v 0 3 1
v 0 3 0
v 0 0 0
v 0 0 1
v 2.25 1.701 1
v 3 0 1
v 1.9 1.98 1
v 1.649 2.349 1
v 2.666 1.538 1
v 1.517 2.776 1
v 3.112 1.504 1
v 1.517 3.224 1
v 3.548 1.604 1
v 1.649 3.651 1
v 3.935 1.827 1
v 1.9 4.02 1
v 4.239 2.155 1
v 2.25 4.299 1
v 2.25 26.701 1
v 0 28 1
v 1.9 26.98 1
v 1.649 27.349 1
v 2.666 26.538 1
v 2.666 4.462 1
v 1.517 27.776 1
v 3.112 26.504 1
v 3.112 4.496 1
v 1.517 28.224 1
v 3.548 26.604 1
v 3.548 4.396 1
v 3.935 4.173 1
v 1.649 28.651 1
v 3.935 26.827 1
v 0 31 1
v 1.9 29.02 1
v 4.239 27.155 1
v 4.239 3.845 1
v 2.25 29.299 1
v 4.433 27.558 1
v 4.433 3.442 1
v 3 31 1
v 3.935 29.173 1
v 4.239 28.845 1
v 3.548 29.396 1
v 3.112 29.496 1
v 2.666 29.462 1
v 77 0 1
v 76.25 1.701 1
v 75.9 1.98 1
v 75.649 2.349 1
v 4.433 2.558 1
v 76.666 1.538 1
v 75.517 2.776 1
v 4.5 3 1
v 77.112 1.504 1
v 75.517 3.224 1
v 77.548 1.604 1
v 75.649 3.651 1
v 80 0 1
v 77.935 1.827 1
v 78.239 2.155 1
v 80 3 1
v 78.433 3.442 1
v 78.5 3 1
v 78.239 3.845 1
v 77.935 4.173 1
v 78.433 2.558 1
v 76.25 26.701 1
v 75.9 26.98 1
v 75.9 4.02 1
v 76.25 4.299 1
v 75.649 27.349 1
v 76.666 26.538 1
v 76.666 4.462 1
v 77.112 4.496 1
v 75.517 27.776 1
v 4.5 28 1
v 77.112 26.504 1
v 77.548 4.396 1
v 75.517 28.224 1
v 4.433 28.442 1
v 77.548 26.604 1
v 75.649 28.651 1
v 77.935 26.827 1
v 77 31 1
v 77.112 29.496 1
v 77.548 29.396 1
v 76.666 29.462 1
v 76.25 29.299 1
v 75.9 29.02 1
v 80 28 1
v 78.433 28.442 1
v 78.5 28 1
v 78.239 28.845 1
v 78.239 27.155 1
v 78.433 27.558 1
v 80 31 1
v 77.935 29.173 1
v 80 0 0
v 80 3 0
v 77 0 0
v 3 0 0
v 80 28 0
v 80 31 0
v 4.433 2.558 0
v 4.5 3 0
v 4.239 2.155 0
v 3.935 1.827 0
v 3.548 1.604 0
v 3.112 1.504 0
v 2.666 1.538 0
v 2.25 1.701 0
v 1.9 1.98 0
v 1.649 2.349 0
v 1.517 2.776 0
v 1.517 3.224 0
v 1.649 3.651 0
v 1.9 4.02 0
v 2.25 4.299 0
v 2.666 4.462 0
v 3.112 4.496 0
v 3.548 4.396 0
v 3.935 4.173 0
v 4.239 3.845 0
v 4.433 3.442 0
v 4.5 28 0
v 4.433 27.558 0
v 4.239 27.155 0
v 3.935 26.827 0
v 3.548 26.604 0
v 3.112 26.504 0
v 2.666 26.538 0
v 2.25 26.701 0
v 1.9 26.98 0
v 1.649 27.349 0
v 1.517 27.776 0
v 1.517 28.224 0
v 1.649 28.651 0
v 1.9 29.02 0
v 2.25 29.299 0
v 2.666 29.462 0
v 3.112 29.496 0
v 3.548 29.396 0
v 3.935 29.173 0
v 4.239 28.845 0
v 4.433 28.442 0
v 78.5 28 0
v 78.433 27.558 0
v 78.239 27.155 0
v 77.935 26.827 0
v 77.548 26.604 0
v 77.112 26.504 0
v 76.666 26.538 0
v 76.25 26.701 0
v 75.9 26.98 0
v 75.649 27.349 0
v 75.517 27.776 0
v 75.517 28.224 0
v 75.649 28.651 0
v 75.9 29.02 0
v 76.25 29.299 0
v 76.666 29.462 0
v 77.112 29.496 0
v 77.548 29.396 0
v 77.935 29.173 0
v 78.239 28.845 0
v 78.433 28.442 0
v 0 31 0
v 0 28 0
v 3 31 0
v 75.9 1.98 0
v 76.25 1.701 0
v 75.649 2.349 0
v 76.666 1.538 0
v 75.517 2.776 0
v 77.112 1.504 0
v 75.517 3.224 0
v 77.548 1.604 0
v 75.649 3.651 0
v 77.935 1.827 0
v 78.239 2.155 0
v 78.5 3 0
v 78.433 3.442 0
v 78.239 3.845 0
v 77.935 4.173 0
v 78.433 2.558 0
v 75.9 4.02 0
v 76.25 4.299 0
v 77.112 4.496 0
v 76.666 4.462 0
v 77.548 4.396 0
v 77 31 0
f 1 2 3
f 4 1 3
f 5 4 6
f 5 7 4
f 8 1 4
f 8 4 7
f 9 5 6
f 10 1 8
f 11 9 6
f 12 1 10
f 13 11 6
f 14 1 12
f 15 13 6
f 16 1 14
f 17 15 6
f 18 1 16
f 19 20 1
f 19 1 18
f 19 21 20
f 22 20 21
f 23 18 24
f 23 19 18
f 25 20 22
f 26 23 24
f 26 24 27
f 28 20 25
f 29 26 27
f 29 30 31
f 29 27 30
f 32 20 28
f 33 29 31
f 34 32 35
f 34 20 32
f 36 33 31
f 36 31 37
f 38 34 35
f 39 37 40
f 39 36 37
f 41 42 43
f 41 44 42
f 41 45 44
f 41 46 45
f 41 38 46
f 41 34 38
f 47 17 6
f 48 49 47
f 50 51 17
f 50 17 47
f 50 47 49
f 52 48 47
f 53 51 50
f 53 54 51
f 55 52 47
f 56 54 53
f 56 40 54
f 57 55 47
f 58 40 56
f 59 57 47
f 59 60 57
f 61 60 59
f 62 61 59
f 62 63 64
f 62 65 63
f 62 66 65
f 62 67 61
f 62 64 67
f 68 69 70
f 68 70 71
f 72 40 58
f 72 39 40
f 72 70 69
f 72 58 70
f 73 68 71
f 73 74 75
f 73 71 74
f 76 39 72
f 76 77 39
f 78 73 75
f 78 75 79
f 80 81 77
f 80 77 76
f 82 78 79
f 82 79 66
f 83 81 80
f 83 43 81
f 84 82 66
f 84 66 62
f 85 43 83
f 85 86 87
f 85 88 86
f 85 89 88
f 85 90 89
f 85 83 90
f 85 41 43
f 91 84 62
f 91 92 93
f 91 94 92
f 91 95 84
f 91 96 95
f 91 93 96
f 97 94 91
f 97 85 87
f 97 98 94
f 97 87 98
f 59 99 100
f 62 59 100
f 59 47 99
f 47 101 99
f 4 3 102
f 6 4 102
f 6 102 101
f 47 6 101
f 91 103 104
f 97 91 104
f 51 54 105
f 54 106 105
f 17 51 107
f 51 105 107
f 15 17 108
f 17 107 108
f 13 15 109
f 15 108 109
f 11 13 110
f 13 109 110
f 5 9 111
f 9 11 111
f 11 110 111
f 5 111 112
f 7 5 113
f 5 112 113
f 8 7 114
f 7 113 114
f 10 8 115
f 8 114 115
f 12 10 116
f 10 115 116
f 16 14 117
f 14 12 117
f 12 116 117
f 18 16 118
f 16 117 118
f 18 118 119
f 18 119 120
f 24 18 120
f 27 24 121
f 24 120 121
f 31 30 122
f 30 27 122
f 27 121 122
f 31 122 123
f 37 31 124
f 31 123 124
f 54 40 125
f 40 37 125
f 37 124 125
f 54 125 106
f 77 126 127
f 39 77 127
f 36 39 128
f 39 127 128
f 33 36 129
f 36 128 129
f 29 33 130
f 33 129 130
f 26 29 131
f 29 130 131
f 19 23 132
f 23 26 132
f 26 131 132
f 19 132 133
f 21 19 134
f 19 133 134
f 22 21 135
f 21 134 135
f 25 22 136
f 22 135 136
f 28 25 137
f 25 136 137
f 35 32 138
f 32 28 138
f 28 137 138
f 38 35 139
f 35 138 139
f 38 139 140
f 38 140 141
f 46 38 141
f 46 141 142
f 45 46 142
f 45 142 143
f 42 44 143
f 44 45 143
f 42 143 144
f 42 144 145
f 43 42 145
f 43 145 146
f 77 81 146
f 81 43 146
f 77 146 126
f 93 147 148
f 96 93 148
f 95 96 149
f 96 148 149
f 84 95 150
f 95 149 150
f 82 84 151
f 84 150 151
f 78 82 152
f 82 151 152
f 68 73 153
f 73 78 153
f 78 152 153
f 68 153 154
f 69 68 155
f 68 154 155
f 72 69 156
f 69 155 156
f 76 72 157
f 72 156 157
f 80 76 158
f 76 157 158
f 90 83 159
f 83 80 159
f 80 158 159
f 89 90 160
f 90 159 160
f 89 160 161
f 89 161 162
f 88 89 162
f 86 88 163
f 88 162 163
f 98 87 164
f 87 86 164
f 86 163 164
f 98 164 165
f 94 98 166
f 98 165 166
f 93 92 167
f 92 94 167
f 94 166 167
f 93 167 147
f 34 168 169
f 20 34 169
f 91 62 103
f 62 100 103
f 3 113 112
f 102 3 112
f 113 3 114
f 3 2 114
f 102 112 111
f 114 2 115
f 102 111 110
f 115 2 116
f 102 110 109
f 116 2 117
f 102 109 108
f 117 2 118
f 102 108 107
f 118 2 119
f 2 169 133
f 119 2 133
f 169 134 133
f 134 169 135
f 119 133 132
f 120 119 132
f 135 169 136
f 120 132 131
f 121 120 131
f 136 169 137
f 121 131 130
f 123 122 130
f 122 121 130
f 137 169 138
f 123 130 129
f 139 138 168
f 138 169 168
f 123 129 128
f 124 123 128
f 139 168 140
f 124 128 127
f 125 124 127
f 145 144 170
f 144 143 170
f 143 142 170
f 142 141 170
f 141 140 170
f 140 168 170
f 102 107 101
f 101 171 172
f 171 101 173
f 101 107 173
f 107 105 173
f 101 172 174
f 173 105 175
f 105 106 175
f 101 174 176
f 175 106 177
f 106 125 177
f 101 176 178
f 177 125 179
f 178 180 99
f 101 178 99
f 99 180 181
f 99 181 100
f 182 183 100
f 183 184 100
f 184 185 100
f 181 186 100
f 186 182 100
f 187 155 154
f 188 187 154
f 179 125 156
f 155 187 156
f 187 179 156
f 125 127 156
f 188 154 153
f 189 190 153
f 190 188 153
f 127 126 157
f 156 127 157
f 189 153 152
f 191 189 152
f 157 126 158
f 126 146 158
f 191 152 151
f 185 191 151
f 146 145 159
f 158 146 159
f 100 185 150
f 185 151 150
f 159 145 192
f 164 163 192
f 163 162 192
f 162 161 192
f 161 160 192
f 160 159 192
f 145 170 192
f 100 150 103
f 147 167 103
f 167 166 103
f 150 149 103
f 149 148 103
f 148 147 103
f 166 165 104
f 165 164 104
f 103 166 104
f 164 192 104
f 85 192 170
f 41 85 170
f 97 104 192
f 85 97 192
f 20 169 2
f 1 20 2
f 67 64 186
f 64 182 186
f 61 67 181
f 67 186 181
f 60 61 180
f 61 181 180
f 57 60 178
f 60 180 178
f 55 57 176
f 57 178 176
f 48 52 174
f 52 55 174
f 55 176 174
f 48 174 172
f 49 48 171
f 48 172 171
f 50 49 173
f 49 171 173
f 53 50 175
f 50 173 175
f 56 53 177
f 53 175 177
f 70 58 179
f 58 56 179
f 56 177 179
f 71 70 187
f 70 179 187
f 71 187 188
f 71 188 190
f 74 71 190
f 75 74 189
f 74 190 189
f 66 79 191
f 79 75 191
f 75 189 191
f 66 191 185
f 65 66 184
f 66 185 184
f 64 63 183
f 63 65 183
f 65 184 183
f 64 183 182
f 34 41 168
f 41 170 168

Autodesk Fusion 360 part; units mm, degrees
sketch "スケッチ1" plane through (0, 0, 0) normal (0, 0, 1) x (1, 0, 0)
  line L0 (0, 0) -> (80, 0)
  line L1 (80, 0) -> (80, 31)
  line L2 (80, 31) -> (0, 31)
  line L3 (0, 31) -> (0, 0)
  line L4 (0, 31) -> (3, 31)
  line L5 (0, 28) -> (0, 31)
  circle A0 centre (3, 28) radius 1.5
  line L6 (0, 0) -> (3, 0)
  line L7 (0, 3) -> (0, 0)
  circle A1 centre (3, 3) radius 1.5
  line L8 (80, 0) -> (77, 0)
  line L9 (80, 3) -> (80, 0)
  line L10 (80, 31) -> (77, 31)
  line L11 (80, 28) -> (80, 31)
  circle A2 centre (77, 28) radius 1.5
  circle A3 centre (77, 3) radius 1.5
  dimension "d1" = 80
  dimension "d2" = 31
  dimension "d3" = 3
  dimension "d4" = 3
  dimension "d5" = 3
  dimension "d6" = 3
  dimension "d7" = 3
  dimension "d8" = 3
  dimension "d9" = 3
extrude "押し出し1" add sketch "スケッチ1" along normal blind 1
